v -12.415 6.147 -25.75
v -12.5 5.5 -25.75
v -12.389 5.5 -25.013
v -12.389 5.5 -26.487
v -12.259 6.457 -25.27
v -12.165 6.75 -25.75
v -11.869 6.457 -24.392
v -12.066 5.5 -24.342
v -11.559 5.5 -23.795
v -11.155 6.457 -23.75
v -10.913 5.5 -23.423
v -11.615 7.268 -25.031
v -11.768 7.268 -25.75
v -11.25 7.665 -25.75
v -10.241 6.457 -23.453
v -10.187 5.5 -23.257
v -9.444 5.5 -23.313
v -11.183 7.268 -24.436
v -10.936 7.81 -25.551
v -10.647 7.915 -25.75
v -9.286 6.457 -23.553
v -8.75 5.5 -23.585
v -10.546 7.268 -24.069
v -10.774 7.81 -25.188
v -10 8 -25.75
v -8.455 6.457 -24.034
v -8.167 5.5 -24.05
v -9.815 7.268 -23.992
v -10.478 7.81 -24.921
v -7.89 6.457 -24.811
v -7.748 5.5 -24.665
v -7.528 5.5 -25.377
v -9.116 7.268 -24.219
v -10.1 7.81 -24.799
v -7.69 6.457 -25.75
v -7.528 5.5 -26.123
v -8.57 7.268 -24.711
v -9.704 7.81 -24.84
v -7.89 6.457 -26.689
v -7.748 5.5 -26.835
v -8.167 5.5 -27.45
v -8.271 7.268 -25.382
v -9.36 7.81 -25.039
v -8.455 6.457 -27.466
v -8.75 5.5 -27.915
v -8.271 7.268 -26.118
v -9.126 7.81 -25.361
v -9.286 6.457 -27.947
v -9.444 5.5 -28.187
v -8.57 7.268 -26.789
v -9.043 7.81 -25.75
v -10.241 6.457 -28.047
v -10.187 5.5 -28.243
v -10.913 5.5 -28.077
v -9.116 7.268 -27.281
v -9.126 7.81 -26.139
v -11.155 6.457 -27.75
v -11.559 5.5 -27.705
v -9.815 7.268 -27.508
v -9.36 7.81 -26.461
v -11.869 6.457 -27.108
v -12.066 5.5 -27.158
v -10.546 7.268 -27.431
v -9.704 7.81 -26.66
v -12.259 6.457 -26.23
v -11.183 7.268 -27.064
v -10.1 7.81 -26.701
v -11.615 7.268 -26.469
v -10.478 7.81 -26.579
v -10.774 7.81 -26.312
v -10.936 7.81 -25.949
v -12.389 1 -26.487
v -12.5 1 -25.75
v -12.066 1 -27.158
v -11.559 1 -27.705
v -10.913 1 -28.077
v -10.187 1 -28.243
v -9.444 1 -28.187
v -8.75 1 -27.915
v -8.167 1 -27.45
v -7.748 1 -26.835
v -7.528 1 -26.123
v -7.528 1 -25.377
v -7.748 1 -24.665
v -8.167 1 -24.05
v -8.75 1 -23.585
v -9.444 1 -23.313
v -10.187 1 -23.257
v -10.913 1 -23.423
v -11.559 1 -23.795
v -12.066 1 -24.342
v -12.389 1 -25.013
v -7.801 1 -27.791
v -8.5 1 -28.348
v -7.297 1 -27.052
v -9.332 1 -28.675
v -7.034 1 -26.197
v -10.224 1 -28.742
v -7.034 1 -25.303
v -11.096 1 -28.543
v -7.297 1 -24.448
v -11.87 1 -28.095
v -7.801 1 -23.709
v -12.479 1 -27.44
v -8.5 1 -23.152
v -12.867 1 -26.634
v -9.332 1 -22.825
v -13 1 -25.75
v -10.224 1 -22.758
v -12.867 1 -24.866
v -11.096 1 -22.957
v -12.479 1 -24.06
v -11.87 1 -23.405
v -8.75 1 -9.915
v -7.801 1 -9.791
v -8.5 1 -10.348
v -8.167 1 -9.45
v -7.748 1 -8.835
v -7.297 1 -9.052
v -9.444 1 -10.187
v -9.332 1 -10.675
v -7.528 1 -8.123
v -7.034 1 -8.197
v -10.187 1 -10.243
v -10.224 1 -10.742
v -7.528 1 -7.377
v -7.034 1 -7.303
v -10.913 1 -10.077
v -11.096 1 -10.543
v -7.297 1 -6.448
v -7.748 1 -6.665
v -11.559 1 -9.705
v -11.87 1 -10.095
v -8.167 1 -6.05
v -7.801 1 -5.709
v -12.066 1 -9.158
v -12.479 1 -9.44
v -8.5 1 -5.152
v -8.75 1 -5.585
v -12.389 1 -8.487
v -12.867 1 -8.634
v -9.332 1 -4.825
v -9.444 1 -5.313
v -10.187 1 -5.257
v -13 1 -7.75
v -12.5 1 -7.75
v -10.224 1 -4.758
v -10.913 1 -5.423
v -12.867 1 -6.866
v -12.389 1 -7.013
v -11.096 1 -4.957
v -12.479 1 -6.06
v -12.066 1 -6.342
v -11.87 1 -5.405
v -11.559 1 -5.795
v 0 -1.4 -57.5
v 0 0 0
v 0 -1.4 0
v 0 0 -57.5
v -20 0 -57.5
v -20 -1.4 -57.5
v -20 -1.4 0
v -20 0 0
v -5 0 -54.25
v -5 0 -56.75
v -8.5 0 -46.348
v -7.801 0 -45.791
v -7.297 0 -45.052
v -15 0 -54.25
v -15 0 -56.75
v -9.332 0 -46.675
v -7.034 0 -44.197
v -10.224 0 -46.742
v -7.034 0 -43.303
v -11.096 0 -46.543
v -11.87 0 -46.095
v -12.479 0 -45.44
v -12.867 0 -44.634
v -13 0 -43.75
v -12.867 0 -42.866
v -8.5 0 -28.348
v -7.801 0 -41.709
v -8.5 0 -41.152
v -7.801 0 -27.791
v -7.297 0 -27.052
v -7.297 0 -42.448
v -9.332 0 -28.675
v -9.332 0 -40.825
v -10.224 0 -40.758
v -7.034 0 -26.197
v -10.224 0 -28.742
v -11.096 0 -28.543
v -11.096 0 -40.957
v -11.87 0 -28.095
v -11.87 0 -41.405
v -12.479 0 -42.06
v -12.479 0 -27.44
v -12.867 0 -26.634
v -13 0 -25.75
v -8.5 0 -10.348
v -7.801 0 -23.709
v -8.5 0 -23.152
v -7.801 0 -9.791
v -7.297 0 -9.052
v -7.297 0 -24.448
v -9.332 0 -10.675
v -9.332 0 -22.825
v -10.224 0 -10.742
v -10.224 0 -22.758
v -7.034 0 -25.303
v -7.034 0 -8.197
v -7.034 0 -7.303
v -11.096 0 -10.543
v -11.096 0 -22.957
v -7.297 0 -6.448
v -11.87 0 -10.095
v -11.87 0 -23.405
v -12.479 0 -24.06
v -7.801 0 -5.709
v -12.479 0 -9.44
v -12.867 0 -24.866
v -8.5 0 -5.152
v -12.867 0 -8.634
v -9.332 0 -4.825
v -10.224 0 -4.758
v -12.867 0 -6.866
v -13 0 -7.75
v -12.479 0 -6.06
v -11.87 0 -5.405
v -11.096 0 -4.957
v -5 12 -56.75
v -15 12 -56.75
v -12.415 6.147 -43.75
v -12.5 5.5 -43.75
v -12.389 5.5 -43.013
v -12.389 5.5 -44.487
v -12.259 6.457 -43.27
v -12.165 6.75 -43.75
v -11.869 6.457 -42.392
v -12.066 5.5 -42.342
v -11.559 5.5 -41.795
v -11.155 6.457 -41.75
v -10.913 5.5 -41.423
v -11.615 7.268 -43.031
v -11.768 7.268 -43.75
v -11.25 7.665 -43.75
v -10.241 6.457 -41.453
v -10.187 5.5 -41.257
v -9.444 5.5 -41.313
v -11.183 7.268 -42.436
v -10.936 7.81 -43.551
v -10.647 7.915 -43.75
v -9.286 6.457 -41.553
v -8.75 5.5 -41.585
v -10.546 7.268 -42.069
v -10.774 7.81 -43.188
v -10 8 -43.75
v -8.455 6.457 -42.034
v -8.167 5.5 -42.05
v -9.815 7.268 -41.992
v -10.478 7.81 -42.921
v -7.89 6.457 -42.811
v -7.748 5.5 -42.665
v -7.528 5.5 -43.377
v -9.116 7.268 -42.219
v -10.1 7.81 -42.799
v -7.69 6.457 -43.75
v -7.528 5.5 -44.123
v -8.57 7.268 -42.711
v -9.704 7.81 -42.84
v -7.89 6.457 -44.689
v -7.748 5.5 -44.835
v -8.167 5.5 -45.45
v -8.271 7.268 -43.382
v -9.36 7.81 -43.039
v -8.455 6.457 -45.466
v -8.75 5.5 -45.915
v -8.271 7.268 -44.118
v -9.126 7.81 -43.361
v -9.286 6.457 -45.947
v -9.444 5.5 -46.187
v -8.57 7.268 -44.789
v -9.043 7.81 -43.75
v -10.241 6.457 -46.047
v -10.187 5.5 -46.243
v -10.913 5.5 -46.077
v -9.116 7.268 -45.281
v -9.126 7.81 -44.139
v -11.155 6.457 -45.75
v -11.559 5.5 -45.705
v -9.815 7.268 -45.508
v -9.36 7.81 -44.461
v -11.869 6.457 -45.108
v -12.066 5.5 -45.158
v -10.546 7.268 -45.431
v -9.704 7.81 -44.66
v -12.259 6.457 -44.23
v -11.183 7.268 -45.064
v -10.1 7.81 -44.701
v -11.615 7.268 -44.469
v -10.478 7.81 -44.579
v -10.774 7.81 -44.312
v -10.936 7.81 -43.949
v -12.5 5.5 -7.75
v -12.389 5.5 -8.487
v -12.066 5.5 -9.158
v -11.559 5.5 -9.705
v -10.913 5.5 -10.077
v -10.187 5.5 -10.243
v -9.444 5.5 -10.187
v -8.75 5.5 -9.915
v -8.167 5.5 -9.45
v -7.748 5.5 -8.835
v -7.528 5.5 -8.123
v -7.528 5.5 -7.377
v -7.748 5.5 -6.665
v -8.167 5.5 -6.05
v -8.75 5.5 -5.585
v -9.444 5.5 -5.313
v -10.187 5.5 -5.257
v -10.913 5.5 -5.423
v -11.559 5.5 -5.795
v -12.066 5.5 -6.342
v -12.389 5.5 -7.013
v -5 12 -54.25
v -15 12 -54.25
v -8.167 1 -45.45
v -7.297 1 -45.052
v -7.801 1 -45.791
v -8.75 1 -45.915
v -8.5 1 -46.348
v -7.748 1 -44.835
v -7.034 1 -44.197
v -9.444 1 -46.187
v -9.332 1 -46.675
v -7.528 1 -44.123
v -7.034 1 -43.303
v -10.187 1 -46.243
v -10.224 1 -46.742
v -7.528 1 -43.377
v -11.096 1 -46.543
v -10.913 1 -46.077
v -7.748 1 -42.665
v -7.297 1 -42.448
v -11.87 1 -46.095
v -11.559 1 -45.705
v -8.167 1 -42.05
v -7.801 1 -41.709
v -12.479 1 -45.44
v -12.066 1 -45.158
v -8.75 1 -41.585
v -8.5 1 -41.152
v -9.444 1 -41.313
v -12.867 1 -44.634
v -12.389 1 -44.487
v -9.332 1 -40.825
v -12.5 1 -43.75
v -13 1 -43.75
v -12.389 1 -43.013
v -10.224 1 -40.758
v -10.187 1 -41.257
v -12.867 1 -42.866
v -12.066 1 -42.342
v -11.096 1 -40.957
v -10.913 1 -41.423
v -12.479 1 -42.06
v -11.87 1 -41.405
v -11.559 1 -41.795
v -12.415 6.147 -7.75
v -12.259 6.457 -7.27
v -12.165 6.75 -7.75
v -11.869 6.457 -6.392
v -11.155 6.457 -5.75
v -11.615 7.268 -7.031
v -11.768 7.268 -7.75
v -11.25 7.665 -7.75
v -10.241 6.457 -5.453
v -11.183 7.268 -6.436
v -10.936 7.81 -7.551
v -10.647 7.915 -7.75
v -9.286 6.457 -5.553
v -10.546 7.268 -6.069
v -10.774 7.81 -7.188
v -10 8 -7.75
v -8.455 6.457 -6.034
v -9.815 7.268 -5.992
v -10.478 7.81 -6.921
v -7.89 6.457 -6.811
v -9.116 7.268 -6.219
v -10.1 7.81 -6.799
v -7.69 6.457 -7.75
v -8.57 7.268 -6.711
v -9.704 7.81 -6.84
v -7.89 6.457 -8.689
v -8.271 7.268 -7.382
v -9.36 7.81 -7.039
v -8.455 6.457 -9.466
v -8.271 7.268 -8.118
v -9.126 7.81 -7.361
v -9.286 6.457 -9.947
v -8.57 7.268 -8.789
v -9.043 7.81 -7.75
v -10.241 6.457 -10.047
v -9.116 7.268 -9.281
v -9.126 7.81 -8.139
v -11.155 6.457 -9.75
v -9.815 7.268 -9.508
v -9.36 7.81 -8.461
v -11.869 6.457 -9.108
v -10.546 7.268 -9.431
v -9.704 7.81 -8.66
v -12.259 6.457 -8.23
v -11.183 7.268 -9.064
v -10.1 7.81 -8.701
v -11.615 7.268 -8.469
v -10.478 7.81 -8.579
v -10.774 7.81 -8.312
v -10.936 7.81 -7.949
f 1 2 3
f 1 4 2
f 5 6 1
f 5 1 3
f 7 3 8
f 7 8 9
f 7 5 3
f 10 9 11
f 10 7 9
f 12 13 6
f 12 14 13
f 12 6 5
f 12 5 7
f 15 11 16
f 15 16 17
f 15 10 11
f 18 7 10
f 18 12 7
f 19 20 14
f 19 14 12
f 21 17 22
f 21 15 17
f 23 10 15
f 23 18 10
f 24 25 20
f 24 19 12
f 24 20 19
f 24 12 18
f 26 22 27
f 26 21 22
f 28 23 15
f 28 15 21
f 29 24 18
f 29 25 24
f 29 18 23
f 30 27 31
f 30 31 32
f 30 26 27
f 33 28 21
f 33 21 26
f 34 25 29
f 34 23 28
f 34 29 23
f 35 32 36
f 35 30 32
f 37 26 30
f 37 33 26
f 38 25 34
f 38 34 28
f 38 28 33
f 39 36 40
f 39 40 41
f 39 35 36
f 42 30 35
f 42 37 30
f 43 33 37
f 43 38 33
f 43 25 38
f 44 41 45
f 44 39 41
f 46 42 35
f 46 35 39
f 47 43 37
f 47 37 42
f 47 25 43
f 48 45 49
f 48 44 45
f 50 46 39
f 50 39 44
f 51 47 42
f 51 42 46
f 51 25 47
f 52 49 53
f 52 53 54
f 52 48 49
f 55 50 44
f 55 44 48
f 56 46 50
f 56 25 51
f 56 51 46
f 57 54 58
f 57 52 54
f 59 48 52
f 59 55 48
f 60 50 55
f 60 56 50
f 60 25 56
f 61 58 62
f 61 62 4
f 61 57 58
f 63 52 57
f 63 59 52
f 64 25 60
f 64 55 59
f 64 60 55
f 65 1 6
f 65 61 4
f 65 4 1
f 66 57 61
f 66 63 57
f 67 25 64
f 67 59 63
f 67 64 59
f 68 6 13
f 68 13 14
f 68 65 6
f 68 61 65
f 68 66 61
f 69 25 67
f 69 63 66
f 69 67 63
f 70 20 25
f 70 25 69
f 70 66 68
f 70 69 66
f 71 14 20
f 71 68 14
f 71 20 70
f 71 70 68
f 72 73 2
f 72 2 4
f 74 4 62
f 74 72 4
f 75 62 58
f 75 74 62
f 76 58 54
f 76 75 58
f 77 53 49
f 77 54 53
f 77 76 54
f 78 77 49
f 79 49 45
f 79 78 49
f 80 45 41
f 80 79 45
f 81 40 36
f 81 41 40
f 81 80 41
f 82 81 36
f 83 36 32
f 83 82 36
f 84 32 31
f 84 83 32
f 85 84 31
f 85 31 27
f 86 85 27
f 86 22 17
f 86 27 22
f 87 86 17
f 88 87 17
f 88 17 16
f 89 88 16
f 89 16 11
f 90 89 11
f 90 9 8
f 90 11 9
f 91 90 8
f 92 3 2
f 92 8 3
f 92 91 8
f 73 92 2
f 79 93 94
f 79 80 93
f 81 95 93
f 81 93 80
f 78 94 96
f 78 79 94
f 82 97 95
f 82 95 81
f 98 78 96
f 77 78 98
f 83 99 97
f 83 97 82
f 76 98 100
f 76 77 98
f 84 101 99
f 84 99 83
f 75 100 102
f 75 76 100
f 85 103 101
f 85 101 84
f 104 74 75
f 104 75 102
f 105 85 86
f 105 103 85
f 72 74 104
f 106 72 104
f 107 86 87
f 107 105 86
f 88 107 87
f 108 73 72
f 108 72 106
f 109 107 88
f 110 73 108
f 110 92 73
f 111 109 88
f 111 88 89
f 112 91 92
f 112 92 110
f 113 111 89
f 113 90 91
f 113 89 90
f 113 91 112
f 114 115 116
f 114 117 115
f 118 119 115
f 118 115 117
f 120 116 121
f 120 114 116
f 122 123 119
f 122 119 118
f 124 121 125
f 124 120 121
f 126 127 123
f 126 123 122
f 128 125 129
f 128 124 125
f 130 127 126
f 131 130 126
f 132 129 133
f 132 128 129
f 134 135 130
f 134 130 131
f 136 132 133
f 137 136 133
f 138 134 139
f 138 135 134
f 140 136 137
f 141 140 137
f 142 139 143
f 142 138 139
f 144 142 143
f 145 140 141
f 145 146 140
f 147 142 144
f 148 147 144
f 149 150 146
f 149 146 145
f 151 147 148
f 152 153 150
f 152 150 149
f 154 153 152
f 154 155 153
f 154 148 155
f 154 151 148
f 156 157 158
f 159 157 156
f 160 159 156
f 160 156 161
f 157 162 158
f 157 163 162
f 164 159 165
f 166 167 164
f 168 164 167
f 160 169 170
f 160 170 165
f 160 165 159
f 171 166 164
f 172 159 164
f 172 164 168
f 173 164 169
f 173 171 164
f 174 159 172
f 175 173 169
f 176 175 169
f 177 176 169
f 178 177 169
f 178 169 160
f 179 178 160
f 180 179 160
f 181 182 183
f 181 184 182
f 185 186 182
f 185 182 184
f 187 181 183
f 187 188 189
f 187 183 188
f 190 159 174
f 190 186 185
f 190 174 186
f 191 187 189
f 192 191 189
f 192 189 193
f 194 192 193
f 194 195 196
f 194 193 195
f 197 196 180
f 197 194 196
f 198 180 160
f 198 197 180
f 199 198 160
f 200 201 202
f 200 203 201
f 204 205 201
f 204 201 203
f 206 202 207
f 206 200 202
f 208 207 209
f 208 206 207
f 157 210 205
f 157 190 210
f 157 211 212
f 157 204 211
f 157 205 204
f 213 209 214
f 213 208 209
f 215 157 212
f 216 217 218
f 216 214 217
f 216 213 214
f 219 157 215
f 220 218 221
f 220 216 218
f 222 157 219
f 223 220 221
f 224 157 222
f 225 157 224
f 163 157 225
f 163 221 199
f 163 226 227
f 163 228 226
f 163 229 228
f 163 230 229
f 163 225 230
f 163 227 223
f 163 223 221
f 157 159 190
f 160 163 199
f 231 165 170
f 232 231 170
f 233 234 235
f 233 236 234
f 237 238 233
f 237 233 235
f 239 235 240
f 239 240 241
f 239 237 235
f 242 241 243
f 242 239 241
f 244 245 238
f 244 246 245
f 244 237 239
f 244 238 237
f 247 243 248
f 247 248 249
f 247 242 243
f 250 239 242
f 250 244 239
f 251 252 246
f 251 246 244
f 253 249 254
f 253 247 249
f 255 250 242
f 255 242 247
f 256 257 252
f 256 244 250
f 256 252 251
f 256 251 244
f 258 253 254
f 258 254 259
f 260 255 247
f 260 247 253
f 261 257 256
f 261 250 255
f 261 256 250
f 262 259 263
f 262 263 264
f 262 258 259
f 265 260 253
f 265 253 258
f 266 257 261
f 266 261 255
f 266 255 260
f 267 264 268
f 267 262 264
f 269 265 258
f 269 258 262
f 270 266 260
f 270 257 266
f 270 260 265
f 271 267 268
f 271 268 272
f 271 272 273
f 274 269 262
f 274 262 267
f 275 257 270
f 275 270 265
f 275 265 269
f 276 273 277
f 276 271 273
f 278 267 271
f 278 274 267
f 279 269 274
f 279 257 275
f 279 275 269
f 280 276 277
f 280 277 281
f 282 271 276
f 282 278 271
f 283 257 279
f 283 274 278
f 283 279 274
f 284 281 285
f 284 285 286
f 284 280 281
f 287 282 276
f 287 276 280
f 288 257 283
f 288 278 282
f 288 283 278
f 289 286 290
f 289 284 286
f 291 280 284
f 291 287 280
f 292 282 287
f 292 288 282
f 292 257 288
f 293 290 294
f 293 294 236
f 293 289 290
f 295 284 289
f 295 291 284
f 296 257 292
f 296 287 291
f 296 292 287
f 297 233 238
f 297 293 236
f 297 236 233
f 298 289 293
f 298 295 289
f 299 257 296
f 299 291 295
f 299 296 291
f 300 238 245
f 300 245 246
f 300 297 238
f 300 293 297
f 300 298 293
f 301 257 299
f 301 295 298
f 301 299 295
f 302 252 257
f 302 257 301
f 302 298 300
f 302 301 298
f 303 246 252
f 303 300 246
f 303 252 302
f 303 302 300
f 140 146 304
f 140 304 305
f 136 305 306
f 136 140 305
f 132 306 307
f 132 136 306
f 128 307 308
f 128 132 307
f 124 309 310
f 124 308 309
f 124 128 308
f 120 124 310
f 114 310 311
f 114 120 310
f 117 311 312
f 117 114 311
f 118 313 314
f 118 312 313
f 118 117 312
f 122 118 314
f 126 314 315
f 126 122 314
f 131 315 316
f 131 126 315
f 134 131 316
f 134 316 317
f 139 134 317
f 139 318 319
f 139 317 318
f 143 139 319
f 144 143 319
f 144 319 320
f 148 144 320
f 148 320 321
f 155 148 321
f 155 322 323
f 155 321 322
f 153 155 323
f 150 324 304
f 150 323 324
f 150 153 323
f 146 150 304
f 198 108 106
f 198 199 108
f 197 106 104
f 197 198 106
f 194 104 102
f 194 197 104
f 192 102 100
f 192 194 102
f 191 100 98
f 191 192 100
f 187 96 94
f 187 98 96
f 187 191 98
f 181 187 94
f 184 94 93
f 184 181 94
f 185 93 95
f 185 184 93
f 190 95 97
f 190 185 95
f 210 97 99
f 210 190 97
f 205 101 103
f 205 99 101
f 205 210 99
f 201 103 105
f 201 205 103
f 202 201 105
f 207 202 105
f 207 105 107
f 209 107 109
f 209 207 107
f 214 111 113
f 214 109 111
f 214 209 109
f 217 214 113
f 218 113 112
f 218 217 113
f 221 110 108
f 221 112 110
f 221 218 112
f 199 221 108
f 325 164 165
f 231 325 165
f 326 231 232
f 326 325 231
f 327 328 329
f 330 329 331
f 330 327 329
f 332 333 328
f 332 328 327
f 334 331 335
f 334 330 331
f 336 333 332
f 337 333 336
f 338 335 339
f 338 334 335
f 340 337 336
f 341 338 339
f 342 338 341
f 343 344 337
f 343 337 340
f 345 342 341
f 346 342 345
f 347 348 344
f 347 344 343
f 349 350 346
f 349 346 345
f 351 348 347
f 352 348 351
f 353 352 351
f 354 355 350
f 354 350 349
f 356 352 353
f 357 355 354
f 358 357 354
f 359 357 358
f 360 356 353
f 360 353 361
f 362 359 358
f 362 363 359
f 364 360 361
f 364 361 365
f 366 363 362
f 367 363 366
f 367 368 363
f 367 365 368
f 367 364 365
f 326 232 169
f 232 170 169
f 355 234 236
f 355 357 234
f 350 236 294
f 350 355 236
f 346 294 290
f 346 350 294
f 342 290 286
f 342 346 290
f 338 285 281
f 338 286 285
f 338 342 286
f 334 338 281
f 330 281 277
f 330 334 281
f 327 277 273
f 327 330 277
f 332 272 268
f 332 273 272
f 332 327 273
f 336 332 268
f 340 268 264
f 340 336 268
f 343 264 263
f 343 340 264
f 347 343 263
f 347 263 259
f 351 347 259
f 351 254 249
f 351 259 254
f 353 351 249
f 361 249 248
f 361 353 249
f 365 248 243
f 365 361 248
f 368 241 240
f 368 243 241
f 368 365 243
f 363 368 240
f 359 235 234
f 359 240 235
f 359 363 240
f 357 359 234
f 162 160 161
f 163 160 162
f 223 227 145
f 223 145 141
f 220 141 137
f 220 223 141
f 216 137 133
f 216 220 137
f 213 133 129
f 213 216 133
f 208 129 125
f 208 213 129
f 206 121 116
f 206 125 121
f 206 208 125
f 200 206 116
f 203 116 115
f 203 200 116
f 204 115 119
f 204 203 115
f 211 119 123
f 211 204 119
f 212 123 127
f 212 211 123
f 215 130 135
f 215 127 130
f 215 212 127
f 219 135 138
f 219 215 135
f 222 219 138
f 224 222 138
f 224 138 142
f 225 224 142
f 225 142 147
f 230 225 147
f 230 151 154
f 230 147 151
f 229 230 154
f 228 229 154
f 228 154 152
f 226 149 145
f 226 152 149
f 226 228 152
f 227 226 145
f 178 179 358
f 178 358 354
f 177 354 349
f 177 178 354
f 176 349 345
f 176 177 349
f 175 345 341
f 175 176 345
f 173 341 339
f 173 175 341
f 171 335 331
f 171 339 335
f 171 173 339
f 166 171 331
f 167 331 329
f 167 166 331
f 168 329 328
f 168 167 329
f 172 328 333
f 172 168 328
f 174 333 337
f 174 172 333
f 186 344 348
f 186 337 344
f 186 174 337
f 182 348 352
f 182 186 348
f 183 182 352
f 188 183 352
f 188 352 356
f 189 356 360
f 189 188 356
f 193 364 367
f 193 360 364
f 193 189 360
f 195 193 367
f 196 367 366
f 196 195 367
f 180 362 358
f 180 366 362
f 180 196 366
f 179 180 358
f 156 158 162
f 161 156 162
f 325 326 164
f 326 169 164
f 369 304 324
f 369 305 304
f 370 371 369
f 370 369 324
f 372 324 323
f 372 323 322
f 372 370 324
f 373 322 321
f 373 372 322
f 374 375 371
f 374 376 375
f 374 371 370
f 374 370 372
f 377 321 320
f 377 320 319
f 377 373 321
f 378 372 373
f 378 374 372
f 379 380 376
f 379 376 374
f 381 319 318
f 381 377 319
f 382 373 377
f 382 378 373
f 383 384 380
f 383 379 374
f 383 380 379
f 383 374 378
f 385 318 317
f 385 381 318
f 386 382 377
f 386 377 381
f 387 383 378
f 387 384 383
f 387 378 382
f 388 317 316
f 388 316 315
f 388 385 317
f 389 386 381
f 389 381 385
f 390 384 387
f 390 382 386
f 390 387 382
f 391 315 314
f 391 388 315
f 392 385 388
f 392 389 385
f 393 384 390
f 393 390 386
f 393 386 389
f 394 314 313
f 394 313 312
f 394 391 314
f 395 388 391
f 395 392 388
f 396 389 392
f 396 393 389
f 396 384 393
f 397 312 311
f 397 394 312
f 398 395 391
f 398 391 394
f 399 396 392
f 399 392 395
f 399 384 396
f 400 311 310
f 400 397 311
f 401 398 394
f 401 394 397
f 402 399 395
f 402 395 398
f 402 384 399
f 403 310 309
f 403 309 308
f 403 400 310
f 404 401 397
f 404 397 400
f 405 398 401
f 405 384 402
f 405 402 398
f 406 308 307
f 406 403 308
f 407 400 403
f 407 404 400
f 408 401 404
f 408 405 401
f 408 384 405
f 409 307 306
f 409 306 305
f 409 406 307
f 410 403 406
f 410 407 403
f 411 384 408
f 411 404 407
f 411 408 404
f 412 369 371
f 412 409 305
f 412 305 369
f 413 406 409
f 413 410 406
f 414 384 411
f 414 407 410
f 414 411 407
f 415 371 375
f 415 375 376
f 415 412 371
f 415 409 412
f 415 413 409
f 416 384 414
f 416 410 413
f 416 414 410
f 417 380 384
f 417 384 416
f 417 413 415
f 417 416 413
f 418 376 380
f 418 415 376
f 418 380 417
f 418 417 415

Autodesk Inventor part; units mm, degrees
ref_plane "YZ Plane" through (0, 0, 0) normal (1, 0, 0) x (0, 1, 0)
ref_plane "XZ Plane" through (0, 0, 0) normal (0, 1, 0) x (-1, 0, 0)
ref_plane "XY Plane" through (0, 0, 0) normal (0, 0, 1) x (1, 0, 0)
sketch "Sketch1" plane through (0, 0, 0) normal (0, 1, 0) x (-1, 0, 0)
  line L0 (20, 0) -> (0, 0)
  line L1 (0, 0) -> (0, -57.5)
  line L2 (0, -57.5) -> (20, -57.5)
  line L3 (20, -57.5) -> (20, 0)
  circle A0 centre (10, -7.75) radius 2.5
  circle A1 centre (10, -25.75) radius 2.5
  circle A2 centre (10, -43.75) radius 2.5
  line L4 (15, -54.25) -> (5, -54.25)
  line L5 (5, -54.25) -> (5, -56.75)
  line L6 (5, -56.75) -> (15, -56.75)
  line L7 (15, -56.75) -> (15, -54.25)
  circle A3 centre (10, -7.75) radius 3
  circle A4 centre (10, -25.75) radius 3
  circle A5 centre (10, -43.75) radius 3
  dimension "d0" = 57.5
  dimension "d1" = 20
  dimension "d2" = 5
  dimension "d3" = 5
  dimension "d4" = 5
  dimension "d8" = 0.75
  dimension "d9" = 2.5
  dimension "d10" = 10
  dimension "d20" = 10
  dimension "d21" = 5
  dimension "d22" = 6
  dimension "d23" = 6
  dimension "d24" = 6
  dimension "d45" = 7.75
  dimension "d46" = 18
  dimension "d47" = 18
extrude "Extrusion1" add sketch "Sketch1" against normal blind 1.4 contours L3 L2 L1 L0 | A0 | A1 | A2 | L7 L6 L5 L4 | A3 | A4 | A5
extrude "Extrusion2" add sketch "Sketch1" along normal blind 12 contours L7 L6 L5 L4
extrude "Extrusion5" add sketch "Sketch1" along normal blind 8 contours A0
extrude "Extrusion6" add sketch "Sketch1" along normal blind 1 contours A3
fillet "Fillet4" radius 2.5 1 edges at (-7.5, 8, -7.75)
extrude "Extrusion7" add sketch "Sketch1" along normal blind 1 contours A4
extrude "Extrusion8" add sketch "Sketch1" along normal blind 8 contours A1
fillet "Fillet5" radius 2.5 1 edges at (-7.5, 8, -25.75)
extrude "Extrusion9" add sketch "Sketch1" along normal blind 8 contours A2
extrude "Extrusion10" add sketch "Sketch1" along normal blind 1 contours A5
fillet "Fillet6" radius 2.5 1 edges at (-7.5, 8, -43.75)
properties part number "Led_Board_V1"
